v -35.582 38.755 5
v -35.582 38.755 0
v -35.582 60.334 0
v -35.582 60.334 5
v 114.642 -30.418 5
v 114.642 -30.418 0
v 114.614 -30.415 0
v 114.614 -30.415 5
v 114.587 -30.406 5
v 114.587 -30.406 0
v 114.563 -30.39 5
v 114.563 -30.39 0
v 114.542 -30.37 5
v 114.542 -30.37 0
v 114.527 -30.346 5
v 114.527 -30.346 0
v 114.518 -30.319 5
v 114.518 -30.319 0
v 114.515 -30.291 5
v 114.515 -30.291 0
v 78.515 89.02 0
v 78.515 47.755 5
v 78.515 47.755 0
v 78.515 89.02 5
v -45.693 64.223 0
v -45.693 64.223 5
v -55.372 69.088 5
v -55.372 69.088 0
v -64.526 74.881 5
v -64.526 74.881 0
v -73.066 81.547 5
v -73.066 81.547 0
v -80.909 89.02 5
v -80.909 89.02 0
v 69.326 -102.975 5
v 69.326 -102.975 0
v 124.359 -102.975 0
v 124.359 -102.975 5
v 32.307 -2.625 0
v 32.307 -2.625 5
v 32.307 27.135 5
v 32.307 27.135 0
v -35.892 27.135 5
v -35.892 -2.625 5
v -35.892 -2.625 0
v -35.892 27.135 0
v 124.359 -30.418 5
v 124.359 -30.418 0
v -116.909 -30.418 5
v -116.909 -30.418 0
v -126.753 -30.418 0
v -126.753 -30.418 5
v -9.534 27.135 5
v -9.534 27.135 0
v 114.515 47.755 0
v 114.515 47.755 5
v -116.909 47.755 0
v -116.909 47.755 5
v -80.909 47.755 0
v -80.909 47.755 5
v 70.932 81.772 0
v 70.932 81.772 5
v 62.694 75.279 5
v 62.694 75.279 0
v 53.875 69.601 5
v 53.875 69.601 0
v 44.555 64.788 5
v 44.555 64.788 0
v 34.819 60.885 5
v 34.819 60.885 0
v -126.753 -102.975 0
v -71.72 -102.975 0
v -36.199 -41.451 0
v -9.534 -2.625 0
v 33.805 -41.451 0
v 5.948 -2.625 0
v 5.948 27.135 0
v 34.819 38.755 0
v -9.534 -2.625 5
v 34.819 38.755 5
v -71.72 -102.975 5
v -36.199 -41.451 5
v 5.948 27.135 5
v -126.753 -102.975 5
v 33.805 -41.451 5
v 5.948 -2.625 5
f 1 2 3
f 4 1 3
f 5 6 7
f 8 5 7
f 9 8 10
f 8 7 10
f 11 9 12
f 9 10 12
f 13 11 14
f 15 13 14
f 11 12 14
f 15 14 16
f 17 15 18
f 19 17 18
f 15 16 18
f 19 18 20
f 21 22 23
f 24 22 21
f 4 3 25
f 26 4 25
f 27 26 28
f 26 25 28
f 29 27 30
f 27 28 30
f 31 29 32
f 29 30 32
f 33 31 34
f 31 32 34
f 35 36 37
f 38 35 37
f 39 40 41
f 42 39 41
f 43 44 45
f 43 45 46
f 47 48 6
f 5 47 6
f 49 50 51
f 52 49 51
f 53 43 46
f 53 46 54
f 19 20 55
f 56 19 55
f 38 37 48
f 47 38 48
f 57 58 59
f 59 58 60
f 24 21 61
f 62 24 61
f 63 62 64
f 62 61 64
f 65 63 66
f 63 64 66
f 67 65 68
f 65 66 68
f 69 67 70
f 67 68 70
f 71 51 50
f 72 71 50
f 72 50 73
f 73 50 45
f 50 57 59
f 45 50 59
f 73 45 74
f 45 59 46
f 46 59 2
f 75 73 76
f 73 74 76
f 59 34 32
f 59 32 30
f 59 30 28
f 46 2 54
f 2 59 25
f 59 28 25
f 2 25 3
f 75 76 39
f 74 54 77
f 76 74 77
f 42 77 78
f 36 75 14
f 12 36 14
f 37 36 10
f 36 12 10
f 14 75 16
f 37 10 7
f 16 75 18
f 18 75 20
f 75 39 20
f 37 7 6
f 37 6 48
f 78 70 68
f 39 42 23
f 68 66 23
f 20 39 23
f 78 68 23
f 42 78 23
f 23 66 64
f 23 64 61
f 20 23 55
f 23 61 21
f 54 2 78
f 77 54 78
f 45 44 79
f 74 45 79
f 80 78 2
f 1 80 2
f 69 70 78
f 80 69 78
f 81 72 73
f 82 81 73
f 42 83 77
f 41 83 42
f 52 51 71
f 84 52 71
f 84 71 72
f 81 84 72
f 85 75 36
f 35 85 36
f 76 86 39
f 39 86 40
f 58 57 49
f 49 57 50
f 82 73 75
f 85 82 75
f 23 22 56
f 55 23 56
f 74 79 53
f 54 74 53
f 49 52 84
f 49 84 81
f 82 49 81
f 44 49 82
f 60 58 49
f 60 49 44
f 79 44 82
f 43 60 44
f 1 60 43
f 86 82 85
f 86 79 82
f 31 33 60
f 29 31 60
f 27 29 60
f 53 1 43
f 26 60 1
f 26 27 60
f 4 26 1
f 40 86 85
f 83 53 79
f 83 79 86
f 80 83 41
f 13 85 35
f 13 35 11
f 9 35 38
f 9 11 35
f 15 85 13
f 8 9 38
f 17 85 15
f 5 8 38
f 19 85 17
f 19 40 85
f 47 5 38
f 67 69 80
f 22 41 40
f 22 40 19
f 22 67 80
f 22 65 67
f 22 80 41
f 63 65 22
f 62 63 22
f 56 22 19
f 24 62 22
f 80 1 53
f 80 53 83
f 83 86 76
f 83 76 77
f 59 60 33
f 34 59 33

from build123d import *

# Parameters (mm, degrees)
BOSS_EXTRUDE1_DEPTH = 5
SKETCH2_W           = 26.358753283
SKETCH2_H           = 29.759882739
CUT_EXTRUDE1_DEPTH  = 5
SKETCH3_W           = 34.735720487
SKETCH3_H           = 8.029761026
BOSS_EXTRUDE2_DEPTH = 5
SKETCH4_W           = 54.614047871
SKETCH4_H           = 63
SKETCH4_W_2         = 55.31958059
CUT_EXTRUDE2_DEPTH  = 10


with BuildPart() as part:
    # Sketch1 → Boss-Extrude1 (new body)
    with BuildSketch(Plane.XY):
        with BuildLine():
            Line((-91.993742522, 102.725612705), (-126.729463009, 102.725612705))
            Line((-126.729463009, 102.725612705), (-126.746200519, 82.983777967))
            Line((-126.746200519, 82.983777967), (-126.751305113, 69.550155563))
            Line((-126.751305113, 69.550155563), (-126.751615017, 54.928897922))
            Line((-126.751615017, 54.928897922), (-116.909086823, 54.928897922))
            Line((-116.909086823, 54.928897922), (-116.909086823, -30.41815046))
            Line((-116.909086823, -30.41815046), (-126.752882712, -30.41815046))
            Line((-126.752882712, -30.41815046), (-126.752882712, -102.974632312))
            Line((-126.752882712, -102.974632312), (-71.719920422, -102.974632312))
            Line((-71.719920422, -102.974632312), (-36.199181634, -41.450908009))
            Line((-36.199181634, -41.450908009), (33.804891756, -41.450908009))
            Line((33.804891756, -41.450908009), (69.325630544, -102.974632312))
            Line((69.325630544, -102.974632312), (124.358592834, -102.974632312))
            Line((124.358592834, -102.974632312), (124.358592834, -30.41815046))
            Line((124.358592834, -30.41815046), (114.641773971, -30.41815046))
            ThreePointArc((114.641773971, -30.41815046), (114.551987655, -30.38095975), (114.514796945, -30.291173434))
            Line((114.514796945, -30.291173434), (114.514796945, 54.801920897))
            ThreePointArc((114.514796945, 54.801920897), (114.551987655, 54.891707213), (114.641773971, 54.928897922))
            Line((114.641773971, 54.928897922), (124.357325139, 54.928897922))
            Line((124.357325139, 54.928897922), (124.357015448, 69.54009331))
            Line((124.357015448, 69.54009331), (124.351902115, 82.993834667))
            Line((124.351902115, 82.993834667), (124.335173131, 102.725612705))
            Line((124.335173131, 102.725612705), (89.599452644, 102.725612705))
            ThreePointArc((89.599452644, 102.725612705), (65.571107836, 77.403597365), (34.818671263, 60.885320824))
            Line((34.818671263, 60.885320824), (34.818671263, 38.755373731))
            Line((34.818671263, 38.755373731), (-35.581655871, 38.755373731))
            Line((-35.581655871, 38.755373731), (-35.581655871, 60.334309069))
            ThreePointArc((-35.581655871, 60.334309069), (-67.279163206, 76.883706742), (-91.993742522, 102.725612705))
        make_face()
    extrude(amount=BOSS_EXTRUDE1_DEPTH)

    # Sketch2 → Cut-Extrude1 (cut)
    with BuildSketch(Plane.XY.offset(5)):
        with Locations((19.127528046, 12.255373732)):
            Rectangle(SKETCH2_W, SKETCH2_H)
        with Locations((-22.712961142, 12.255373732)):
            Rectangle(SKETCH2_W, SKETCH2_H)
    extrude(amount=-CUT_EXTRUDE1_DEPTH, mode=Mode.SUBTRACT)

    # Sketch3 → Boss-Extrude2 (add)
    with BuildSketch(Plane.XY.offset(5)):
        with Locations((-109.361602766, 106.740493218)):
            Rectangle(SKETCH3_W, SKETCH3_H)
        with Locations((106.967312888, 106.740493218)):
            Rectangle(SKETCH3_W, SKETCH3_H)
    extrude(amount=-BOSS_EXTRUDE2_DEPTH)

    # Sketch4 → Cut-Extrude2 (cut)
    with BuildSketch(Plane.XY.offset(5)):
        with Locations((105.82182088, 79.255373731)):
            Rectangle(SKETCH4_W, SKETCH4_H)
        with Locations((-108.568877118, 79.255373731)):
            Rectangle(SKETCH4_W_2, SKETCH4_H)
    extrude(amount=-CUT_EXTRUDE2_DEPTH, mode=Mode.SUBTRACT)


solid = part.part
